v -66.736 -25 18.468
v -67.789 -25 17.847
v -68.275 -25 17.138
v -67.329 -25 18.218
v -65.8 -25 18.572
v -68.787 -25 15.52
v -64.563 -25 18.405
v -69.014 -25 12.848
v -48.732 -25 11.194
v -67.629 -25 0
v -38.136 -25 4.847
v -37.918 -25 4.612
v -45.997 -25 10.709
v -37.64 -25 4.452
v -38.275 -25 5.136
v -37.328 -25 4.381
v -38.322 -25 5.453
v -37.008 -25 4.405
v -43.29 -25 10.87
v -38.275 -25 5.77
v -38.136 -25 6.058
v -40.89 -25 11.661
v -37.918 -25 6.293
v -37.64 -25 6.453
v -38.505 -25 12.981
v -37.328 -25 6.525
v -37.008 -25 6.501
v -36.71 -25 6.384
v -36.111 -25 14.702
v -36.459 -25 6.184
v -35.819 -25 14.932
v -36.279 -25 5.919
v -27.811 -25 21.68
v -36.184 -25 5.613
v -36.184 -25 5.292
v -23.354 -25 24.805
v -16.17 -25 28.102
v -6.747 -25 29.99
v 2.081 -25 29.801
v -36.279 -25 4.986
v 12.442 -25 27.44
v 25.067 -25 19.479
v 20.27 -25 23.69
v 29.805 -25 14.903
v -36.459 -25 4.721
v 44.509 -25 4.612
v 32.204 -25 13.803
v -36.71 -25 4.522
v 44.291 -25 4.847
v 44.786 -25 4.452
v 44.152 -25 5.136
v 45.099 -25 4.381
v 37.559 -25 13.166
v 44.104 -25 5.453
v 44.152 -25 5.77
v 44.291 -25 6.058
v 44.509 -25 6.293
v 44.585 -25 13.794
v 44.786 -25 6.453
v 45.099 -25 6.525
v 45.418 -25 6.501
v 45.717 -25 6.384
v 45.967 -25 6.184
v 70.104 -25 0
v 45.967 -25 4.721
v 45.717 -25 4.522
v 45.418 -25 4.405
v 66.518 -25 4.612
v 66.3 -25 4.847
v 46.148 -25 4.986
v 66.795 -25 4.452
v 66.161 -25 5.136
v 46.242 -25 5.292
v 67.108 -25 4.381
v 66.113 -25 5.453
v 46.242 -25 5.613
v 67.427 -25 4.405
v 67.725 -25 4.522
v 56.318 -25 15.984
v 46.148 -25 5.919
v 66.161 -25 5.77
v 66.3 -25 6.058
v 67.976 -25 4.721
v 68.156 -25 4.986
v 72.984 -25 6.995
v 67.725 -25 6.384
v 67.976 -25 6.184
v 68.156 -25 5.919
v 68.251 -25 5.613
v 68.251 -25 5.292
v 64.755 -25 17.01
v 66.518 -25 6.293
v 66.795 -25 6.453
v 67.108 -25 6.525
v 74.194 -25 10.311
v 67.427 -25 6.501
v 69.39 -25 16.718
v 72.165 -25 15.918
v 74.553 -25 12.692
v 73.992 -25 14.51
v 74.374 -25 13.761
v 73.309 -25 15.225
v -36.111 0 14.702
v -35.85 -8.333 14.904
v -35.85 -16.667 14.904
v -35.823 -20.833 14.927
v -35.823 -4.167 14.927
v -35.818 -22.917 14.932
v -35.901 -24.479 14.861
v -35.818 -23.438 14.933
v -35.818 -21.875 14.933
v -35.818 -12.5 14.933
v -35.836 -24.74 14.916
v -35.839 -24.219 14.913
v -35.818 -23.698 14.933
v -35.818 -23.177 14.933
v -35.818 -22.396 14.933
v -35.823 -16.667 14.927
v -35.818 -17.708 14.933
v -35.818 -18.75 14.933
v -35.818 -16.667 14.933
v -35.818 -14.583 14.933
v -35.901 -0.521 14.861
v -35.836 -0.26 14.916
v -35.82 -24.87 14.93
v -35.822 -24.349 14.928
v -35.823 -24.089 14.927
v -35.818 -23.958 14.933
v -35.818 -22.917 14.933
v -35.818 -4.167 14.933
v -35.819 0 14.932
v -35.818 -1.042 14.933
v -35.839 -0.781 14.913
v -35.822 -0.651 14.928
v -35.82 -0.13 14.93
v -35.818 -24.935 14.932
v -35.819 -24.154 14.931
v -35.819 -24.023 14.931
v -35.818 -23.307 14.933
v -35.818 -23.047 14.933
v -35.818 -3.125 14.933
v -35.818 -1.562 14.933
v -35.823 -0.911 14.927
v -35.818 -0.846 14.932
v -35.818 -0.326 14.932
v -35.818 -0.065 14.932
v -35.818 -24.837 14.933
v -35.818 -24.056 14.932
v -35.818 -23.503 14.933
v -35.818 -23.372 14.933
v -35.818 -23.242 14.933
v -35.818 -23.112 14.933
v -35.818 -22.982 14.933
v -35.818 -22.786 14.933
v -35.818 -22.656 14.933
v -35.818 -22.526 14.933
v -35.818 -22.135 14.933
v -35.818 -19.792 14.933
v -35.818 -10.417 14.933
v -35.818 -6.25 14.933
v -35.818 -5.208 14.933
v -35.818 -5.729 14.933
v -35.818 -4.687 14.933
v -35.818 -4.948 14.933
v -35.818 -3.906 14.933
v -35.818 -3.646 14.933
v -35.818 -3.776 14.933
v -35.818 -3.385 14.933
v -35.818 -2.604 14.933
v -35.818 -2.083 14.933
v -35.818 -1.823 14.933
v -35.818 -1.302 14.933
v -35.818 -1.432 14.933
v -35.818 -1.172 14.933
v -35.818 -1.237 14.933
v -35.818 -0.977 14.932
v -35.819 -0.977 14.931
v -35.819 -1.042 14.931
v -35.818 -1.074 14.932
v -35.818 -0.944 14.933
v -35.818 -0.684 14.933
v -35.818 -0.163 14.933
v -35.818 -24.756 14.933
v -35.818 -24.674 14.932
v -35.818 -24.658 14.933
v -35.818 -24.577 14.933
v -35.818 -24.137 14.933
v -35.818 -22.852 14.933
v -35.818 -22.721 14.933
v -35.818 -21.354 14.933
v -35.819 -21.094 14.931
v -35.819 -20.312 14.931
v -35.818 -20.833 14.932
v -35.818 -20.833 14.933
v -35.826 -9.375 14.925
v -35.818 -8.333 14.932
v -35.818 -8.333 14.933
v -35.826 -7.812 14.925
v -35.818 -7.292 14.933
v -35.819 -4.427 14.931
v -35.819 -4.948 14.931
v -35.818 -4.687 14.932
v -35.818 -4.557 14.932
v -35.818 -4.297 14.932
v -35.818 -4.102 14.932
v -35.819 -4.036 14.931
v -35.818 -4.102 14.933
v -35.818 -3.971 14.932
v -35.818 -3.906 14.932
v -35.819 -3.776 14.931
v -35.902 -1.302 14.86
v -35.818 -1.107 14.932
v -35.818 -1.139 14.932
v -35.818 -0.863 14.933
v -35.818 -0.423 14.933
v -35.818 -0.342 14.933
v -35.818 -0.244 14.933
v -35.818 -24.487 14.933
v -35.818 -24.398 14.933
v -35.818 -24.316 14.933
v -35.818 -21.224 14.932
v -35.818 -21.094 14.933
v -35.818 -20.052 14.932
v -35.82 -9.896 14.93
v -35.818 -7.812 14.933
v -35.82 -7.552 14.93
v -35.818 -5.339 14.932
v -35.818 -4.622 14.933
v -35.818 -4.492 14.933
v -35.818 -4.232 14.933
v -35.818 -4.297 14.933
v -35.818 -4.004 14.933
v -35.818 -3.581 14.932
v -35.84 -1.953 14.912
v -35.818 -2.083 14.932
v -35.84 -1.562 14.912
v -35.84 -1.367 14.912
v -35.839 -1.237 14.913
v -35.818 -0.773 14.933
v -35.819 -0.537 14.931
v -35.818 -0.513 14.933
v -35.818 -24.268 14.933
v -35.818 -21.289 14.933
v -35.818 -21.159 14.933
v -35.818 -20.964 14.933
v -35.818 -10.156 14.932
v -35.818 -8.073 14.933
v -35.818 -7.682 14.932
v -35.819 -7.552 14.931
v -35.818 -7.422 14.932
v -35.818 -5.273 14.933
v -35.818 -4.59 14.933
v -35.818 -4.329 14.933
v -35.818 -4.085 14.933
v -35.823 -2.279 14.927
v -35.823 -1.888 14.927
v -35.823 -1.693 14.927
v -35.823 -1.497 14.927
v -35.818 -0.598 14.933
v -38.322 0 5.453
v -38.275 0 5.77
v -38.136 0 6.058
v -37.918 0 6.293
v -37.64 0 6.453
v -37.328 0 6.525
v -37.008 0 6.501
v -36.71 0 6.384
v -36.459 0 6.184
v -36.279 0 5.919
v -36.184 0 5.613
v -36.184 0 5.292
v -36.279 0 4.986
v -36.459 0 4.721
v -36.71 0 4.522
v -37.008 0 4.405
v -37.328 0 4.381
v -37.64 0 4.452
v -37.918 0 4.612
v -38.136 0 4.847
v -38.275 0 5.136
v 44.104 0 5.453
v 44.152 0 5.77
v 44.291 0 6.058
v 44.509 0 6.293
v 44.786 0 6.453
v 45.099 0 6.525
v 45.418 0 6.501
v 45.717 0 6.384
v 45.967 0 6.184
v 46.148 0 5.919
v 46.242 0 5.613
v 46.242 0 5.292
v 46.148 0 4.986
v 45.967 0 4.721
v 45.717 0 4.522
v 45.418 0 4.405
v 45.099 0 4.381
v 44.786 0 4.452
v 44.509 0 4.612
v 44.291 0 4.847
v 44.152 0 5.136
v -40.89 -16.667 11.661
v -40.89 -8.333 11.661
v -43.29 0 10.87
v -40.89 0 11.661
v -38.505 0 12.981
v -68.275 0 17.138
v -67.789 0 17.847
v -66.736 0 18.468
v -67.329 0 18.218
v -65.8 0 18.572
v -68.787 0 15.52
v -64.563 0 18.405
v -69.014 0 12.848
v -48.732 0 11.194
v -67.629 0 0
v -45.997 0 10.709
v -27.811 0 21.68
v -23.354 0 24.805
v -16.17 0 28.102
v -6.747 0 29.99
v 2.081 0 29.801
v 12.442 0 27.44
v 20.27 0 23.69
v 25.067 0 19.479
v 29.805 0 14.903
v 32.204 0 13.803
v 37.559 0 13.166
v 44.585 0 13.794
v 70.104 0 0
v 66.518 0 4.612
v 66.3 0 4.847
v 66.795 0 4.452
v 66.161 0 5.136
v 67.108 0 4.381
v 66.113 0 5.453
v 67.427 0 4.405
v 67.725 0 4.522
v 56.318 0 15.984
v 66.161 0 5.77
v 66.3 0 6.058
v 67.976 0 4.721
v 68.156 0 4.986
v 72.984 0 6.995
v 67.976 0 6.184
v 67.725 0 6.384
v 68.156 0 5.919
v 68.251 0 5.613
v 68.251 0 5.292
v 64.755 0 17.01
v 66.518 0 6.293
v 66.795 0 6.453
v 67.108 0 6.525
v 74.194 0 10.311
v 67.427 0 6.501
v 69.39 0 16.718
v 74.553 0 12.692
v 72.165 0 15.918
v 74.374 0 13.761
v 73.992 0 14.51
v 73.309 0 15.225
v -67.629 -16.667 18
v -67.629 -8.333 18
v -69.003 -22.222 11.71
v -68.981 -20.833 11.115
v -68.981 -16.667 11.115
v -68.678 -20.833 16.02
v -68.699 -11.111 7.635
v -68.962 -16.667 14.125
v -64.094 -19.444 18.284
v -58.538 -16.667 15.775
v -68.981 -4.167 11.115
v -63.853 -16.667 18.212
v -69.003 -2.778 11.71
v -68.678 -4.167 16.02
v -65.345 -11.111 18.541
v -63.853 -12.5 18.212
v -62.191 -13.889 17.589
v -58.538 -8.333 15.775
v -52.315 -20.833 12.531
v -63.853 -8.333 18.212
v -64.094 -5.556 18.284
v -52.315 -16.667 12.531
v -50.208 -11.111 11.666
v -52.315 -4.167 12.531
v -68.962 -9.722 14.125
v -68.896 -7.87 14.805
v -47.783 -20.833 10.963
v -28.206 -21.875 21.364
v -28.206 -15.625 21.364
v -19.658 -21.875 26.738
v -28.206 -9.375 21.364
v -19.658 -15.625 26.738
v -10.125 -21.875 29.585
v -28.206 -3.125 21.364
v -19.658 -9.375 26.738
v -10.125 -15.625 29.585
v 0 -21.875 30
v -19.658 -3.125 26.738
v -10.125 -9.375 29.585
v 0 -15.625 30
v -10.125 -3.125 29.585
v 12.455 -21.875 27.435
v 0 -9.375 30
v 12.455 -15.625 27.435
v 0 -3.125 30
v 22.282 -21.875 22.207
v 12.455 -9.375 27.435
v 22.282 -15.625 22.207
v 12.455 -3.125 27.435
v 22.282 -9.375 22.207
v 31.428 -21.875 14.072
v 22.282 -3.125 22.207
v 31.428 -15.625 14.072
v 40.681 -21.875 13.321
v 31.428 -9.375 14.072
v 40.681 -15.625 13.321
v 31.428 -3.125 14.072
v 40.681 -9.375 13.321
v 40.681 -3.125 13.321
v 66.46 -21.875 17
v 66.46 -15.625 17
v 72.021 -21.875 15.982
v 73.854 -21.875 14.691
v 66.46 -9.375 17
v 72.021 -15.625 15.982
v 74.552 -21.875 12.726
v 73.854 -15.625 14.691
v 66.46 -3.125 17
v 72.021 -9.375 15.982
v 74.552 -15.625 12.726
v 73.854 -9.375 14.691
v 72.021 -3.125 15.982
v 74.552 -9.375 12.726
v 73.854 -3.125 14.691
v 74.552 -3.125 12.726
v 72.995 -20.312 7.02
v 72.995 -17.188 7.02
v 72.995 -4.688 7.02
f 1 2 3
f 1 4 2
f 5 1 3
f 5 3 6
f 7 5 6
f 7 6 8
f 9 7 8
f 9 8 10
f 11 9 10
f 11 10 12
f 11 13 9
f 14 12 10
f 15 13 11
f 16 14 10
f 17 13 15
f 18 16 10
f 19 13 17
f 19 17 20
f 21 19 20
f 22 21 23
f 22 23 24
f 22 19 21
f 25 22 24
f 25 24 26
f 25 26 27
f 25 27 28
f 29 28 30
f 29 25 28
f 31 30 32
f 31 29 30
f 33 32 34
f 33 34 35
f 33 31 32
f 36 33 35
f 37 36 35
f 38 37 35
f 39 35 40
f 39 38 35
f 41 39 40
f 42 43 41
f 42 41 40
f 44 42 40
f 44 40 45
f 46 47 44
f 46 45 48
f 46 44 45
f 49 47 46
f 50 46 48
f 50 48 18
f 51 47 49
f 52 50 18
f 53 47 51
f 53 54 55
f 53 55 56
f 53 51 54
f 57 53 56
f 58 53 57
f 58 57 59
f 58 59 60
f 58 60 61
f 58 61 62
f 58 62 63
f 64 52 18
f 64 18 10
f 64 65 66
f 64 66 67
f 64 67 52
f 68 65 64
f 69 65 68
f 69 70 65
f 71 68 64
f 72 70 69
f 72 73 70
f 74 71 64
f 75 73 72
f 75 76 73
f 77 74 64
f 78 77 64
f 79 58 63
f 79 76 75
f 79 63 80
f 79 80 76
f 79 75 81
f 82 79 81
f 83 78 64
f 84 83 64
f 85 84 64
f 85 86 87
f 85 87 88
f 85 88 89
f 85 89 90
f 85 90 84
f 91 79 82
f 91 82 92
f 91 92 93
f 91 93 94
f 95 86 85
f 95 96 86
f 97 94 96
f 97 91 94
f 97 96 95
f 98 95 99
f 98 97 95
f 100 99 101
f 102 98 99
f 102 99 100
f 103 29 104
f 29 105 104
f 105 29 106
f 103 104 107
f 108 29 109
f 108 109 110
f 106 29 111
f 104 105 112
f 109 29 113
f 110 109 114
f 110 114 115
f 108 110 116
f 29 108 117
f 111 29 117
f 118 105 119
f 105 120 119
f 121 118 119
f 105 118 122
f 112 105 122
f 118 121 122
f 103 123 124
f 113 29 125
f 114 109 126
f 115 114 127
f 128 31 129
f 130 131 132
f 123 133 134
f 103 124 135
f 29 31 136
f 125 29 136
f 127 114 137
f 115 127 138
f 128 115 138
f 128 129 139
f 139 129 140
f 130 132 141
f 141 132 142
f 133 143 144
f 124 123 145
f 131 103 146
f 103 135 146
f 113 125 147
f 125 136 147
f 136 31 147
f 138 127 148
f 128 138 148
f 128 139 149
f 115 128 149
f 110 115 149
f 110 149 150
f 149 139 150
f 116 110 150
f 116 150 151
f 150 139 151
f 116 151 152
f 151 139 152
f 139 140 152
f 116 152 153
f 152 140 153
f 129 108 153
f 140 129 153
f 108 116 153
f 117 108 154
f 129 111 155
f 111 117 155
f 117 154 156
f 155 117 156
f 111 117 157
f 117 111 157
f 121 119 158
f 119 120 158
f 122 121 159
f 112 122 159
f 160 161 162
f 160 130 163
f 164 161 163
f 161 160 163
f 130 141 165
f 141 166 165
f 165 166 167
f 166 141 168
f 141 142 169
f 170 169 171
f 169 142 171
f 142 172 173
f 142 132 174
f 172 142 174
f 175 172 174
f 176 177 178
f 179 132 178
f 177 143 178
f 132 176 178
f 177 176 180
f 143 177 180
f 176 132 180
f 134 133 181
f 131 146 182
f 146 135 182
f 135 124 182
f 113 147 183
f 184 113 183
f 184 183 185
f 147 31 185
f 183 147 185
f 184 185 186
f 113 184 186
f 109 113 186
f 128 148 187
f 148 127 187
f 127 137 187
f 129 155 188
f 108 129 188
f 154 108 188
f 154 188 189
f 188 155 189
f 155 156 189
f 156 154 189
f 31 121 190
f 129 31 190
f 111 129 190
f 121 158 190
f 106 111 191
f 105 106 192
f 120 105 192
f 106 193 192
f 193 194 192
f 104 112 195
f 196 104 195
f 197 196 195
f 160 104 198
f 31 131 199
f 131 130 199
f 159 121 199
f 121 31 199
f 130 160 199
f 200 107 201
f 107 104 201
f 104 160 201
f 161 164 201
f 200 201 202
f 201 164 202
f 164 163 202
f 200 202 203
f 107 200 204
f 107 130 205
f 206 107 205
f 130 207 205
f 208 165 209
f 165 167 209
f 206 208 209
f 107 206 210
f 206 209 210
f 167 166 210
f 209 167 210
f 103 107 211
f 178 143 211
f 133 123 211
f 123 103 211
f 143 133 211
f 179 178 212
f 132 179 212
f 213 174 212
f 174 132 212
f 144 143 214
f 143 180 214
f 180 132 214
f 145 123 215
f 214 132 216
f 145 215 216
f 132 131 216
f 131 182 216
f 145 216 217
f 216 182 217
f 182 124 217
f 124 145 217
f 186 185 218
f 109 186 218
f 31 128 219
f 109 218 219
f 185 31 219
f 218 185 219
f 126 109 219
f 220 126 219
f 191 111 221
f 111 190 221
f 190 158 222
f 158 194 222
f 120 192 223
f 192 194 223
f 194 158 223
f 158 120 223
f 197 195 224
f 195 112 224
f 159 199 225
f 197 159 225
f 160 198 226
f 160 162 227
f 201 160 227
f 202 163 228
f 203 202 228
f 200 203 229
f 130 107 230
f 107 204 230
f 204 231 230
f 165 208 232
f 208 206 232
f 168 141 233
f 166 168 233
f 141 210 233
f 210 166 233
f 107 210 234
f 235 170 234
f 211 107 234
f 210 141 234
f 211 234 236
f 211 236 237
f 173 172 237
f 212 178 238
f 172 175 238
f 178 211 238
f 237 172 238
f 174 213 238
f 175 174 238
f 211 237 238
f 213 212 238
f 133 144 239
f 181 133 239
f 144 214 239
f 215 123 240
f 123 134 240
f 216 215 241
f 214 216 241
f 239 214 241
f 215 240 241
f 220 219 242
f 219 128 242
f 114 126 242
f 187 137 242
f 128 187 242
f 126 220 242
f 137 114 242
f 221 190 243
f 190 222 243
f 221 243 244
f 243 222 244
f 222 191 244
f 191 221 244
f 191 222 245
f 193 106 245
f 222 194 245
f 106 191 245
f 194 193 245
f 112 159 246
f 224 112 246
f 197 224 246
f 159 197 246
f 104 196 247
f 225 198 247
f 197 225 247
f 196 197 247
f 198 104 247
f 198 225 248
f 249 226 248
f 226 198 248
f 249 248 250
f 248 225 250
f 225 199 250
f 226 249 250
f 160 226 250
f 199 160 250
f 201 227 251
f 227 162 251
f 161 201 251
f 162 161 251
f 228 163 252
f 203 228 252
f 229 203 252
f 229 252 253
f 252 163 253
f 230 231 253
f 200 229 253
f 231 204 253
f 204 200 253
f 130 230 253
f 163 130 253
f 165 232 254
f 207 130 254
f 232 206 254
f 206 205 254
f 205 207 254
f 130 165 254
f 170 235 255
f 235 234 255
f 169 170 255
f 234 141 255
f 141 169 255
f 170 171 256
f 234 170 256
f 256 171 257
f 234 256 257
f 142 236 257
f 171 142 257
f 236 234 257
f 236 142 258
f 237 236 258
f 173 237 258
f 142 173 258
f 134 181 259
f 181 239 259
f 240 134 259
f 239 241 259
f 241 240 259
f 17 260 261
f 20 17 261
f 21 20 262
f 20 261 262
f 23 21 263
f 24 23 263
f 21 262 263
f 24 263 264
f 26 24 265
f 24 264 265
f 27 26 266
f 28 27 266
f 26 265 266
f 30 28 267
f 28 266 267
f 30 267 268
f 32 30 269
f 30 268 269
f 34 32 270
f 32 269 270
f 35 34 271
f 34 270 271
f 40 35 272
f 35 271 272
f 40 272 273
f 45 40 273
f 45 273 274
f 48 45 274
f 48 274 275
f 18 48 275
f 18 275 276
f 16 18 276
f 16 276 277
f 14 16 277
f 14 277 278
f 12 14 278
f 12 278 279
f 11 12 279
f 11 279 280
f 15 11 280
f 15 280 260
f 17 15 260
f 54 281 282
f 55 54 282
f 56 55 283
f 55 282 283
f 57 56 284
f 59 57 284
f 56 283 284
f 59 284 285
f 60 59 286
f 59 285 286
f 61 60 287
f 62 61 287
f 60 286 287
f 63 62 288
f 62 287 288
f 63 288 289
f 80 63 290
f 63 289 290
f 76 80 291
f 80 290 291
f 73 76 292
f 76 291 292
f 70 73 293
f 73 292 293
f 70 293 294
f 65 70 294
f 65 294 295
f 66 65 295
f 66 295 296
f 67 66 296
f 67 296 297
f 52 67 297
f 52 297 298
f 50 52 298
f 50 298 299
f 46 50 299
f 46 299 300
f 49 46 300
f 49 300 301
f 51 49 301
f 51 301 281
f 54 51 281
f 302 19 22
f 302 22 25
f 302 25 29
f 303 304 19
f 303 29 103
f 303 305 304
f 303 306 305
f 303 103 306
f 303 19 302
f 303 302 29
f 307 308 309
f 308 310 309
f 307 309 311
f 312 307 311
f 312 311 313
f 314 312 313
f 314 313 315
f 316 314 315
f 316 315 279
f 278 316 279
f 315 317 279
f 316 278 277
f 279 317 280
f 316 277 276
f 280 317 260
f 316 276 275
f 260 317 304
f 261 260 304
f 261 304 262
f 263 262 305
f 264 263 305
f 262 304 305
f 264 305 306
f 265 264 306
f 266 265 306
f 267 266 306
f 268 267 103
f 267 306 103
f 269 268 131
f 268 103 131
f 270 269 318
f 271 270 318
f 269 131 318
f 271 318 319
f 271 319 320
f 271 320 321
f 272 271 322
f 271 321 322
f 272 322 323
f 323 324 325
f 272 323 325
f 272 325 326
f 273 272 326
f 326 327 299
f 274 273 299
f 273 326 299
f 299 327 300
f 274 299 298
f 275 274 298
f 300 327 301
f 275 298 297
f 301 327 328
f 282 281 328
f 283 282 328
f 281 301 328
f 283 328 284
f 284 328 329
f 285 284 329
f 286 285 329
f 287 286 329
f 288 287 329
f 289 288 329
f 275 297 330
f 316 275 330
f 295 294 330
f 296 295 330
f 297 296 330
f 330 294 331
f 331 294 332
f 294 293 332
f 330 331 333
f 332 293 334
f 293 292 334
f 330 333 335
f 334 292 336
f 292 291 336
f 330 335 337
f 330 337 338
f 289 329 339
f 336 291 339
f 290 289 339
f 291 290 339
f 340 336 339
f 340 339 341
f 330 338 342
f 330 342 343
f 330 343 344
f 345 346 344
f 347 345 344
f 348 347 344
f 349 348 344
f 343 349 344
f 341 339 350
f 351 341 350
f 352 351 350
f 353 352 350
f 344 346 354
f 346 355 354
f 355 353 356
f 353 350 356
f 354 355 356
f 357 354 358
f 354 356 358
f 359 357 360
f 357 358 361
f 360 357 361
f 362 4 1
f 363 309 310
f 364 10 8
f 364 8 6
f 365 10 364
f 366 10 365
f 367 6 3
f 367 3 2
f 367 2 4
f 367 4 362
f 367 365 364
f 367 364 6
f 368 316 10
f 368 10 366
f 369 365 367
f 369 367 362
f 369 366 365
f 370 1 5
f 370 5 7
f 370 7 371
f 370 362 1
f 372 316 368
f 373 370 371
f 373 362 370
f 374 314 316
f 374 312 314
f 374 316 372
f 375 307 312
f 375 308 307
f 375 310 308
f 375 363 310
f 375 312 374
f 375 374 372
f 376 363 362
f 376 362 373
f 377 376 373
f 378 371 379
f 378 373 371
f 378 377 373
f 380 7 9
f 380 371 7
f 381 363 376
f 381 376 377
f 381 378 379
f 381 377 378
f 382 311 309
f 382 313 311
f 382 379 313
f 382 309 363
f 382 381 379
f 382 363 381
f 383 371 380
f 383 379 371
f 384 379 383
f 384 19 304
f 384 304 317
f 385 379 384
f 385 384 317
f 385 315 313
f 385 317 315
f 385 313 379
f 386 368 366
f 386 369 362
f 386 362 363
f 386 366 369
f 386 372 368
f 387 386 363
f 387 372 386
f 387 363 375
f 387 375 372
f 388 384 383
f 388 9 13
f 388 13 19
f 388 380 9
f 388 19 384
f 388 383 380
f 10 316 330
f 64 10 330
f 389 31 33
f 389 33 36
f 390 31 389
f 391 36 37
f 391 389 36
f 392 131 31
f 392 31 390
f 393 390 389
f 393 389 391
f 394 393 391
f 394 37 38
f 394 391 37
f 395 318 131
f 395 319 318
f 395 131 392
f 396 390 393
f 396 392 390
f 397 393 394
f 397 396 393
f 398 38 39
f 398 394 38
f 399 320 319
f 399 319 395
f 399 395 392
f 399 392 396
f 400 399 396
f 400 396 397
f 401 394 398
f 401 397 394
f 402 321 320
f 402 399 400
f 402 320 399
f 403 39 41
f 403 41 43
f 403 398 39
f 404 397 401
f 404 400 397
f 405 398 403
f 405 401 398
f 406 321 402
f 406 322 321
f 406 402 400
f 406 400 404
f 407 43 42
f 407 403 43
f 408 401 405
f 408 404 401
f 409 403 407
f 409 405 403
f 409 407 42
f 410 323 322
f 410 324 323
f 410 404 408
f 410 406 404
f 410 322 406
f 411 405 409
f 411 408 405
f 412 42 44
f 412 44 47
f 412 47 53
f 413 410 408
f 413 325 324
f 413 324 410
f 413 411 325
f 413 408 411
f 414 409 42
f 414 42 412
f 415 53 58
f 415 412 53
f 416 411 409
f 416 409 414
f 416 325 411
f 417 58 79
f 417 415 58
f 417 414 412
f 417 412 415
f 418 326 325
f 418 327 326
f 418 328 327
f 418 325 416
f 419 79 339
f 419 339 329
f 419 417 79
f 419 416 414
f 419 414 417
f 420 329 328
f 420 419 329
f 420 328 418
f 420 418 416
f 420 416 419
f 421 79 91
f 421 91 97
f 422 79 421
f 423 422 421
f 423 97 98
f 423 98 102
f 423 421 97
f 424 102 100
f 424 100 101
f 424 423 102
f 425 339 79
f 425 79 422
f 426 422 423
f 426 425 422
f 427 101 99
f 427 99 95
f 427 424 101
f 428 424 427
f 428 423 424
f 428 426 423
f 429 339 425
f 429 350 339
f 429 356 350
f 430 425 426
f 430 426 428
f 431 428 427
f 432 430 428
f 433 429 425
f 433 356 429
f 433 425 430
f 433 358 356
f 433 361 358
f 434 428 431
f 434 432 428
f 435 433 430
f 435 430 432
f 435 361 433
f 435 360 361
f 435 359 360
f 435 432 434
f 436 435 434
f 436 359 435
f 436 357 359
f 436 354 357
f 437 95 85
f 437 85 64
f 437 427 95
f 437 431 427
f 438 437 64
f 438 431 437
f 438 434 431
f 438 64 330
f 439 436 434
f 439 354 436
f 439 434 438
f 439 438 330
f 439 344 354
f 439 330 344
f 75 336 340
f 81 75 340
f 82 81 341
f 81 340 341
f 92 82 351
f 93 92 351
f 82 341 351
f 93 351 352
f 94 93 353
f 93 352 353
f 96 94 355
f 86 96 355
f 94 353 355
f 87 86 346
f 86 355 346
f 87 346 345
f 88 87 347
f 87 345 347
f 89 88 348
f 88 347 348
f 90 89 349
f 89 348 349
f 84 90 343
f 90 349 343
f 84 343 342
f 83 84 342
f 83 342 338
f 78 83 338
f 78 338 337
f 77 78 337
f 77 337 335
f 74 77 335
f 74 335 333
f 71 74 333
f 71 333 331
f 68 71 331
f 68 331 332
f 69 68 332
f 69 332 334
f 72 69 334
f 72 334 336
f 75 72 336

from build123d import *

# Parameters (mm, degrees)
F1_DEPTH = 25
F3_D     = 2.15
F4_R     = 1.075
F5_DEPTH = 25.0010001


with BuildPart() as f1:
    # F0 (on Front) → F1 (new body)
    with BuildSketch(Plane.XZ):
        with BuildLine():
            Line((-67.6292562194, 0), (0, 0))
            Line((0, 0), (70.1037801326, 0))
            add(Edge.make_bspline(
                [(-35.8187206498, 14.9323540671), (-32.3721245175, 17.6670450757), (-22.2804590561, 27.6957336708), (-0.5532035443, 32.4902199692), (23.5358179513, 24.2294862907), (29.7787645974, 10.9587809419), (51.8980669907, 15.0136159709), (65.205743053, 17.913240215), (78.1030507881, 15.097406101), (71.9928192761, 5.4751362852), (70.1037801326, 0)],
                knots=[0.2718233452, 0.2718233452, 0.2718233452, 0.2718233452, 0.3279825198, 0.4313799007, 0.5306522199, 0.6021351082, 0.6932580831, 0.7731682182, 0.8326710129, 0.9104579748, 0.9104579748, 0.9104579748, 0.9104579748], degree=3))
            add(Edge.make_bspline(
                [(-35.8187206498, 14.9323540671), (-35.8040867081, 14.9410882765), (-35.9378695388, 14.8237929522), (-36.1108292553, 14.7023310817)],
                knots=[0.0333037738, 0.0333037738, 0.0333037738, 0.0333037738, 0.165327588, 0.165327588, 0.165327588, 0.165327588], degree=3))
            add(Edge.make_bspline(
                [(-43.2899401356, 10.8699904327), (-40.8750114406, 11.3548434949), (-38.51657576, 12.8226989149), (-36.1108292553, 14.7023310817)],
                knots=[0.2309708757, 0.2309708757, 0.2309708757, 0.2309708757, 0.2702354611, 0.2702354611, 0.2702354611, 0.2702354611], degree=3))
            add(Edge.make_bspline(
                [(-67.6292562194, 0), (-68.8392527492, 7.7181354174), (-70.8763996978, 21.8389822913), (-57.6257413317, 15.6014532234), (-48.3193696397, 9.8602155679), (-43.2899401356, 10.8699904327)],
                knots=[0, 0, 0, 0, 0.0866870461, 0.1491968404, 0.2309708757, 0.2309708757, 0.2309708757, 0.2309708757], degree=3))
        make_face()
    extrude(amount=F1_DEPTH)

    # F3 (through all)
    with Locations(Plane.XZ.offset(25)):
        with Locations((45.1790839434, 5.4526720196), (-37.2473523021, 5.4526720196)):
            Hole(F3_D / 2)

    # F4 (on face) → F5 (cut, through all)
    with BuildSketch(Plane(origin=(0, 0, 0), x_dir=(-1, 0, 0), z_dir=(0, 1, 0))):
        with Locations((-67.1879152943, 5.4526720196)):
            Circle(F4_R)
    extrude(amount=-F5_DEPTH, mode=Mode.SUBTRACT)


solid = f1.part
